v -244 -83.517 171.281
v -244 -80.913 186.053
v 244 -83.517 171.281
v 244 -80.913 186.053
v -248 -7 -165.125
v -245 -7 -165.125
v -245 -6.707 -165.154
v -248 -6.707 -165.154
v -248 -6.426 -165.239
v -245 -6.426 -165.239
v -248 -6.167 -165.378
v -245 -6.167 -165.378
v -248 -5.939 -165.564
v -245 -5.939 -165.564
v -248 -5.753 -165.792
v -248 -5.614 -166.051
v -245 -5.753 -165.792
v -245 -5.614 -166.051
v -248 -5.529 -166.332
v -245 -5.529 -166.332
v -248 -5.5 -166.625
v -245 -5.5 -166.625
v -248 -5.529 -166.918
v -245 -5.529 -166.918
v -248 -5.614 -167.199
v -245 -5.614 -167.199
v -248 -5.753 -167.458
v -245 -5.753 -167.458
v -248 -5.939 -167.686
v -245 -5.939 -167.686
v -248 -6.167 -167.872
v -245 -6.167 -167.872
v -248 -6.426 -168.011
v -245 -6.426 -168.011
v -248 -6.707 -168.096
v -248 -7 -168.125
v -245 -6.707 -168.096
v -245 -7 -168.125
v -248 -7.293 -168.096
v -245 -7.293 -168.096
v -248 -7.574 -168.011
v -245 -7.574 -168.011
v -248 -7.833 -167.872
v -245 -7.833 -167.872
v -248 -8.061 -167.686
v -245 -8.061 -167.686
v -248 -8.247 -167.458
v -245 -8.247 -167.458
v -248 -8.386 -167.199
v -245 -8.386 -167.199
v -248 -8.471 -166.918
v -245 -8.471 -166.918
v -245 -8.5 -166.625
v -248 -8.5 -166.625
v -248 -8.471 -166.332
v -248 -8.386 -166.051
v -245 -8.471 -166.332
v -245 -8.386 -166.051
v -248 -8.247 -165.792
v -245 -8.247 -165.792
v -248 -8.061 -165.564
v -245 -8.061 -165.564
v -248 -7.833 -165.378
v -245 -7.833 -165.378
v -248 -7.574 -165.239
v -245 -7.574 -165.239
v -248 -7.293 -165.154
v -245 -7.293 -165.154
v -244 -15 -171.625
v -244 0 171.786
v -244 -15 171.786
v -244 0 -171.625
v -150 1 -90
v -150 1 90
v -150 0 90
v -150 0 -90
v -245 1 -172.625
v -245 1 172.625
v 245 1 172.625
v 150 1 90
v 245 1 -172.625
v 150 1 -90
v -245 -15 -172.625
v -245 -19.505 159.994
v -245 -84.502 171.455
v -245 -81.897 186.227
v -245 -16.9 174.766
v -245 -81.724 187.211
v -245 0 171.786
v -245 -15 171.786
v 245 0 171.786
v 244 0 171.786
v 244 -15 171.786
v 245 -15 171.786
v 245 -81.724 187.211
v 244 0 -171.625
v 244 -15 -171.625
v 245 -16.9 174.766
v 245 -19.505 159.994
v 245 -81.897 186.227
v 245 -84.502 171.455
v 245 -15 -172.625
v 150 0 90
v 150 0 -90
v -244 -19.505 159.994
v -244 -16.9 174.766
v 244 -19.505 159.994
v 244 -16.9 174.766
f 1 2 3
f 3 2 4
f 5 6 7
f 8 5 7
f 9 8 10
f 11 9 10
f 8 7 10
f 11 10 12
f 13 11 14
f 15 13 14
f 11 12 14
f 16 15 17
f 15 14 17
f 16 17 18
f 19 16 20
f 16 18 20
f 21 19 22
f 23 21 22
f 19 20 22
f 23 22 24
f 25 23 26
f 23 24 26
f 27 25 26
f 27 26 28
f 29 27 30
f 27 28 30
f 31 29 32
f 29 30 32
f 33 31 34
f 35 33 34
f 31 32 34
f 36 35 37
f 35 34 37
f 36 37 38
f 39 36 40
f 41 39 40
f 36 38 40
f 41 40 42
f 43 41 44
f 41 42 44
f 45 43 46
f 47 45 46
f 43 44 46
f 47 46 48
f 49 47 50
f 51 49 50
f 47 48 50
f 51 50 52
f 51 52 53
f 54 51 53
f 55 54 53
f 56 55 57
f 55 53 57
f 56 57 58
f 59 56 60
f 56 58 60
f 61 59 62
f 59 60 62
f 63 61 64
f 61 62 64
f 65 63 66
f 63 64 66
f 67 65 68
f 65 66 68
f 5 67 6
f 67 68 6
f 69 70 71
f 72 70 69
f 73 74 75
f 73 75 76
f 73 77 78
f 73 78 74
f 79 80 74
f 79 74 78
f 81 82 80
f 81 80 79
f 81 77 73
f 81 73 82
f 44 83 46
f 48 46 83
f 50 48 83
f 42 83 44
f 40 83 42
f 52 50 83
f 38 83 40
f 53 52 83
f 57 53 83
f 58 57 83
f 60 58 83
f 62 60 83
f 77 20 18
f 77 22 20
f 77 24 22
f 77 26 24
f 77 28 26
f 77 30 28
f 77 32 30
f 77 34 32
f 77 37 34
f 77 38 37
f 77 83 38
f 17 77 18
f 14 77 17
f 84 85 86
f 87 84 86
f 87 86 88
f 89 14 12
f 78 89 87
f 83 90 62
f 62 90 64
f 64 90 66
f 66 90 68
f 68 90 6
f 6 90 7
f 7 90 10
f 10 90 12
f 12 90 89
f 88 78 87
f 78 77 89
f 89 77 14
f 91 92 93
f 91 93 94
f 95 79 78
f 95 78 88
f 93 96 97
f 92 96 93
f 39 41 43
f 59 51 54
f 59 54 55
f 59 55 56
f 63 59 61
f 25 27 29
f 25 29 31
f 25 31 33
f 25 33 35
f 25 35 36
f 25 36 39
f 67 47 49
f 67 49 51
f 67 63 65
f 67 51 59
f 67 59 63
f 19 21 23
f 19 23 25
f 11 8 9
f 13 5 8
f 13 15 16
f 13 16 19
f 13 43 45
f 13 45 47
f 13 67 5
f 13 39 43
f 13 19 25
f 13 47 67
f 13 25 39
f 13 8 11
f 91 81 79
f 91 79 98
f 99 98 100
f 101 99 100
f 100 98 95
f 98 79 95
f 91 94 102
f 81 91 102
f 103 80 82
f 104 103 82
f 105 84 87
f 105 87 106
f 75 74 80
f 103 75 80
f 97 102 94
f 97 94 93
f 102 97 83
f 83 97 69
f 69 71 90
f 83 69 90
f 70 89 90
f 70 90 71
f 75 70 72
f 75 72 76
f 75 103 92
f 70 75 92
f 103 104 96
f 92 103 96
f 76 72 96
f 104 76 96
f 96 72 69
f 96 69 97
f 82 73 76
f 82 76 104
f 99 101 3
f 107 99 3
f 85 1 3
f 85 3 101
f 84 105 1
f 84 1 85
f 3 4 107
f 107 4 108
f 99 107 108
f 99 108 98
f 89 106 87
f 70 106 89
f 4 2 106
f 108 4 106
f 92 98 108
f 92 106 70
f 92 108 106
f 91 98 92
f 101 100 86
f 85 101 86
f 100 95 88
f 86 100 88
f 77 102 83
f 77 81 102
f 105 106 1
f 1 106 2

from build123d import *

# Parameters (mm, degrees)
CROQUIS1_W              = 490
CROQUIS1_H              = 345.25
SALIENTE_EXTRUIR1_DEPTH = 1
CROQUIS2_W              = 300
CROQUIS2_H              = 180
CORTAR_EXTRUIR1_DEPTH   = 2
SALIENTE_EXTRUIR2_DEPTH = 490
SALIENTE_EXTRUIR3_DEPTH = 15
SALIENTE_EXTRUIR4_DEPTH = 15
CROQUIS6_R              = 1.5
SALIENTE_EXTRUIR5_DEPTH = 3


with BuildPart() as part:
    # Croquis1 → Saliente-Extruir1 (new body)
    with BuildSketch(Plane(origin=(0, 0, 0), x_dir=(1, 0, 0), z_dir=(0, 1, 0))):
        Rectangle(CROQUIS1_W, CROQUIS1_H)
    extrude(amount=SALIENTE_EXTRUIR1_DEPTH)

    # Croquis2 → Cortar-Extruir1 (cut, through all)
    with BuildSketch(Plane(origin=(0, 1, 0), x_dir=(1, 0, 0), z_dir=(0, 1, 0))):
        Rectangle(CROQUIS2_W, CROQUIS2_H)
    extrude(amount=-CORTAR_EXTRUIR1_DEPTH, mode=Mode.SUBTRACT)

    # Croquis3 → Saliente-Extruir2 (add, through all)
    with BuildSketch(Plane(origin=(245, 0, 0), x_dir=(0, 0, -1), z_dir=(1, 0, 0))):
        Polygon((-172.625, 1), (-187.211446924, -81.723851253), (-186.226639171, -81.897499431), (-171.609573388, 1), align=None)
    extrude(amount=-SALIENTE_EXTRUIR2_DEPTH)

    # Croquis4 → Saliente-Extruir3 (add)
    with BuildSketch(Plane.XZ):
        Polygon((-245, -172.625), (-245, 171.785900369), (-244, 171.785900369), (-244, -171.625), (244, -171.625), (244, 171.785900369), (245, 171.785900369), (245, -172.625), align=None)
    extrude(amount=SALIENTE_EXTRUIR3_DEPTH)

    # Croquis5 → Saliente-Extruir4 (add)
    with BuildSketch(Plane(origin=(0, 29.377119133, 166.60592165), x_dir=(-1, 0, 0), z_dir=(0, -0.173648178, -0.984807753))):
        Polygon((-244, -111.991208917), (-244, -46.991208917), (-245, -46.991208917), (-245, -112.991208917), (245, -112.991208917), (245, -46.991208917), (244, -46.991208917), (244, -111.991208917), align=None)
    extrude(amount=SALIENTE_EXTRUIR4_DEPTH)

    # Croquis6 → Saliente-Extruir5 (add)
    with BuildSketch(Plane.ZY.offset(245)):
        with Locations((-166.625, -7)):
            Circle(CROQUIS6_R)
    extrude(amount=SALIENTE_EXTRUIR5_DEPTH)


solid = part.part
